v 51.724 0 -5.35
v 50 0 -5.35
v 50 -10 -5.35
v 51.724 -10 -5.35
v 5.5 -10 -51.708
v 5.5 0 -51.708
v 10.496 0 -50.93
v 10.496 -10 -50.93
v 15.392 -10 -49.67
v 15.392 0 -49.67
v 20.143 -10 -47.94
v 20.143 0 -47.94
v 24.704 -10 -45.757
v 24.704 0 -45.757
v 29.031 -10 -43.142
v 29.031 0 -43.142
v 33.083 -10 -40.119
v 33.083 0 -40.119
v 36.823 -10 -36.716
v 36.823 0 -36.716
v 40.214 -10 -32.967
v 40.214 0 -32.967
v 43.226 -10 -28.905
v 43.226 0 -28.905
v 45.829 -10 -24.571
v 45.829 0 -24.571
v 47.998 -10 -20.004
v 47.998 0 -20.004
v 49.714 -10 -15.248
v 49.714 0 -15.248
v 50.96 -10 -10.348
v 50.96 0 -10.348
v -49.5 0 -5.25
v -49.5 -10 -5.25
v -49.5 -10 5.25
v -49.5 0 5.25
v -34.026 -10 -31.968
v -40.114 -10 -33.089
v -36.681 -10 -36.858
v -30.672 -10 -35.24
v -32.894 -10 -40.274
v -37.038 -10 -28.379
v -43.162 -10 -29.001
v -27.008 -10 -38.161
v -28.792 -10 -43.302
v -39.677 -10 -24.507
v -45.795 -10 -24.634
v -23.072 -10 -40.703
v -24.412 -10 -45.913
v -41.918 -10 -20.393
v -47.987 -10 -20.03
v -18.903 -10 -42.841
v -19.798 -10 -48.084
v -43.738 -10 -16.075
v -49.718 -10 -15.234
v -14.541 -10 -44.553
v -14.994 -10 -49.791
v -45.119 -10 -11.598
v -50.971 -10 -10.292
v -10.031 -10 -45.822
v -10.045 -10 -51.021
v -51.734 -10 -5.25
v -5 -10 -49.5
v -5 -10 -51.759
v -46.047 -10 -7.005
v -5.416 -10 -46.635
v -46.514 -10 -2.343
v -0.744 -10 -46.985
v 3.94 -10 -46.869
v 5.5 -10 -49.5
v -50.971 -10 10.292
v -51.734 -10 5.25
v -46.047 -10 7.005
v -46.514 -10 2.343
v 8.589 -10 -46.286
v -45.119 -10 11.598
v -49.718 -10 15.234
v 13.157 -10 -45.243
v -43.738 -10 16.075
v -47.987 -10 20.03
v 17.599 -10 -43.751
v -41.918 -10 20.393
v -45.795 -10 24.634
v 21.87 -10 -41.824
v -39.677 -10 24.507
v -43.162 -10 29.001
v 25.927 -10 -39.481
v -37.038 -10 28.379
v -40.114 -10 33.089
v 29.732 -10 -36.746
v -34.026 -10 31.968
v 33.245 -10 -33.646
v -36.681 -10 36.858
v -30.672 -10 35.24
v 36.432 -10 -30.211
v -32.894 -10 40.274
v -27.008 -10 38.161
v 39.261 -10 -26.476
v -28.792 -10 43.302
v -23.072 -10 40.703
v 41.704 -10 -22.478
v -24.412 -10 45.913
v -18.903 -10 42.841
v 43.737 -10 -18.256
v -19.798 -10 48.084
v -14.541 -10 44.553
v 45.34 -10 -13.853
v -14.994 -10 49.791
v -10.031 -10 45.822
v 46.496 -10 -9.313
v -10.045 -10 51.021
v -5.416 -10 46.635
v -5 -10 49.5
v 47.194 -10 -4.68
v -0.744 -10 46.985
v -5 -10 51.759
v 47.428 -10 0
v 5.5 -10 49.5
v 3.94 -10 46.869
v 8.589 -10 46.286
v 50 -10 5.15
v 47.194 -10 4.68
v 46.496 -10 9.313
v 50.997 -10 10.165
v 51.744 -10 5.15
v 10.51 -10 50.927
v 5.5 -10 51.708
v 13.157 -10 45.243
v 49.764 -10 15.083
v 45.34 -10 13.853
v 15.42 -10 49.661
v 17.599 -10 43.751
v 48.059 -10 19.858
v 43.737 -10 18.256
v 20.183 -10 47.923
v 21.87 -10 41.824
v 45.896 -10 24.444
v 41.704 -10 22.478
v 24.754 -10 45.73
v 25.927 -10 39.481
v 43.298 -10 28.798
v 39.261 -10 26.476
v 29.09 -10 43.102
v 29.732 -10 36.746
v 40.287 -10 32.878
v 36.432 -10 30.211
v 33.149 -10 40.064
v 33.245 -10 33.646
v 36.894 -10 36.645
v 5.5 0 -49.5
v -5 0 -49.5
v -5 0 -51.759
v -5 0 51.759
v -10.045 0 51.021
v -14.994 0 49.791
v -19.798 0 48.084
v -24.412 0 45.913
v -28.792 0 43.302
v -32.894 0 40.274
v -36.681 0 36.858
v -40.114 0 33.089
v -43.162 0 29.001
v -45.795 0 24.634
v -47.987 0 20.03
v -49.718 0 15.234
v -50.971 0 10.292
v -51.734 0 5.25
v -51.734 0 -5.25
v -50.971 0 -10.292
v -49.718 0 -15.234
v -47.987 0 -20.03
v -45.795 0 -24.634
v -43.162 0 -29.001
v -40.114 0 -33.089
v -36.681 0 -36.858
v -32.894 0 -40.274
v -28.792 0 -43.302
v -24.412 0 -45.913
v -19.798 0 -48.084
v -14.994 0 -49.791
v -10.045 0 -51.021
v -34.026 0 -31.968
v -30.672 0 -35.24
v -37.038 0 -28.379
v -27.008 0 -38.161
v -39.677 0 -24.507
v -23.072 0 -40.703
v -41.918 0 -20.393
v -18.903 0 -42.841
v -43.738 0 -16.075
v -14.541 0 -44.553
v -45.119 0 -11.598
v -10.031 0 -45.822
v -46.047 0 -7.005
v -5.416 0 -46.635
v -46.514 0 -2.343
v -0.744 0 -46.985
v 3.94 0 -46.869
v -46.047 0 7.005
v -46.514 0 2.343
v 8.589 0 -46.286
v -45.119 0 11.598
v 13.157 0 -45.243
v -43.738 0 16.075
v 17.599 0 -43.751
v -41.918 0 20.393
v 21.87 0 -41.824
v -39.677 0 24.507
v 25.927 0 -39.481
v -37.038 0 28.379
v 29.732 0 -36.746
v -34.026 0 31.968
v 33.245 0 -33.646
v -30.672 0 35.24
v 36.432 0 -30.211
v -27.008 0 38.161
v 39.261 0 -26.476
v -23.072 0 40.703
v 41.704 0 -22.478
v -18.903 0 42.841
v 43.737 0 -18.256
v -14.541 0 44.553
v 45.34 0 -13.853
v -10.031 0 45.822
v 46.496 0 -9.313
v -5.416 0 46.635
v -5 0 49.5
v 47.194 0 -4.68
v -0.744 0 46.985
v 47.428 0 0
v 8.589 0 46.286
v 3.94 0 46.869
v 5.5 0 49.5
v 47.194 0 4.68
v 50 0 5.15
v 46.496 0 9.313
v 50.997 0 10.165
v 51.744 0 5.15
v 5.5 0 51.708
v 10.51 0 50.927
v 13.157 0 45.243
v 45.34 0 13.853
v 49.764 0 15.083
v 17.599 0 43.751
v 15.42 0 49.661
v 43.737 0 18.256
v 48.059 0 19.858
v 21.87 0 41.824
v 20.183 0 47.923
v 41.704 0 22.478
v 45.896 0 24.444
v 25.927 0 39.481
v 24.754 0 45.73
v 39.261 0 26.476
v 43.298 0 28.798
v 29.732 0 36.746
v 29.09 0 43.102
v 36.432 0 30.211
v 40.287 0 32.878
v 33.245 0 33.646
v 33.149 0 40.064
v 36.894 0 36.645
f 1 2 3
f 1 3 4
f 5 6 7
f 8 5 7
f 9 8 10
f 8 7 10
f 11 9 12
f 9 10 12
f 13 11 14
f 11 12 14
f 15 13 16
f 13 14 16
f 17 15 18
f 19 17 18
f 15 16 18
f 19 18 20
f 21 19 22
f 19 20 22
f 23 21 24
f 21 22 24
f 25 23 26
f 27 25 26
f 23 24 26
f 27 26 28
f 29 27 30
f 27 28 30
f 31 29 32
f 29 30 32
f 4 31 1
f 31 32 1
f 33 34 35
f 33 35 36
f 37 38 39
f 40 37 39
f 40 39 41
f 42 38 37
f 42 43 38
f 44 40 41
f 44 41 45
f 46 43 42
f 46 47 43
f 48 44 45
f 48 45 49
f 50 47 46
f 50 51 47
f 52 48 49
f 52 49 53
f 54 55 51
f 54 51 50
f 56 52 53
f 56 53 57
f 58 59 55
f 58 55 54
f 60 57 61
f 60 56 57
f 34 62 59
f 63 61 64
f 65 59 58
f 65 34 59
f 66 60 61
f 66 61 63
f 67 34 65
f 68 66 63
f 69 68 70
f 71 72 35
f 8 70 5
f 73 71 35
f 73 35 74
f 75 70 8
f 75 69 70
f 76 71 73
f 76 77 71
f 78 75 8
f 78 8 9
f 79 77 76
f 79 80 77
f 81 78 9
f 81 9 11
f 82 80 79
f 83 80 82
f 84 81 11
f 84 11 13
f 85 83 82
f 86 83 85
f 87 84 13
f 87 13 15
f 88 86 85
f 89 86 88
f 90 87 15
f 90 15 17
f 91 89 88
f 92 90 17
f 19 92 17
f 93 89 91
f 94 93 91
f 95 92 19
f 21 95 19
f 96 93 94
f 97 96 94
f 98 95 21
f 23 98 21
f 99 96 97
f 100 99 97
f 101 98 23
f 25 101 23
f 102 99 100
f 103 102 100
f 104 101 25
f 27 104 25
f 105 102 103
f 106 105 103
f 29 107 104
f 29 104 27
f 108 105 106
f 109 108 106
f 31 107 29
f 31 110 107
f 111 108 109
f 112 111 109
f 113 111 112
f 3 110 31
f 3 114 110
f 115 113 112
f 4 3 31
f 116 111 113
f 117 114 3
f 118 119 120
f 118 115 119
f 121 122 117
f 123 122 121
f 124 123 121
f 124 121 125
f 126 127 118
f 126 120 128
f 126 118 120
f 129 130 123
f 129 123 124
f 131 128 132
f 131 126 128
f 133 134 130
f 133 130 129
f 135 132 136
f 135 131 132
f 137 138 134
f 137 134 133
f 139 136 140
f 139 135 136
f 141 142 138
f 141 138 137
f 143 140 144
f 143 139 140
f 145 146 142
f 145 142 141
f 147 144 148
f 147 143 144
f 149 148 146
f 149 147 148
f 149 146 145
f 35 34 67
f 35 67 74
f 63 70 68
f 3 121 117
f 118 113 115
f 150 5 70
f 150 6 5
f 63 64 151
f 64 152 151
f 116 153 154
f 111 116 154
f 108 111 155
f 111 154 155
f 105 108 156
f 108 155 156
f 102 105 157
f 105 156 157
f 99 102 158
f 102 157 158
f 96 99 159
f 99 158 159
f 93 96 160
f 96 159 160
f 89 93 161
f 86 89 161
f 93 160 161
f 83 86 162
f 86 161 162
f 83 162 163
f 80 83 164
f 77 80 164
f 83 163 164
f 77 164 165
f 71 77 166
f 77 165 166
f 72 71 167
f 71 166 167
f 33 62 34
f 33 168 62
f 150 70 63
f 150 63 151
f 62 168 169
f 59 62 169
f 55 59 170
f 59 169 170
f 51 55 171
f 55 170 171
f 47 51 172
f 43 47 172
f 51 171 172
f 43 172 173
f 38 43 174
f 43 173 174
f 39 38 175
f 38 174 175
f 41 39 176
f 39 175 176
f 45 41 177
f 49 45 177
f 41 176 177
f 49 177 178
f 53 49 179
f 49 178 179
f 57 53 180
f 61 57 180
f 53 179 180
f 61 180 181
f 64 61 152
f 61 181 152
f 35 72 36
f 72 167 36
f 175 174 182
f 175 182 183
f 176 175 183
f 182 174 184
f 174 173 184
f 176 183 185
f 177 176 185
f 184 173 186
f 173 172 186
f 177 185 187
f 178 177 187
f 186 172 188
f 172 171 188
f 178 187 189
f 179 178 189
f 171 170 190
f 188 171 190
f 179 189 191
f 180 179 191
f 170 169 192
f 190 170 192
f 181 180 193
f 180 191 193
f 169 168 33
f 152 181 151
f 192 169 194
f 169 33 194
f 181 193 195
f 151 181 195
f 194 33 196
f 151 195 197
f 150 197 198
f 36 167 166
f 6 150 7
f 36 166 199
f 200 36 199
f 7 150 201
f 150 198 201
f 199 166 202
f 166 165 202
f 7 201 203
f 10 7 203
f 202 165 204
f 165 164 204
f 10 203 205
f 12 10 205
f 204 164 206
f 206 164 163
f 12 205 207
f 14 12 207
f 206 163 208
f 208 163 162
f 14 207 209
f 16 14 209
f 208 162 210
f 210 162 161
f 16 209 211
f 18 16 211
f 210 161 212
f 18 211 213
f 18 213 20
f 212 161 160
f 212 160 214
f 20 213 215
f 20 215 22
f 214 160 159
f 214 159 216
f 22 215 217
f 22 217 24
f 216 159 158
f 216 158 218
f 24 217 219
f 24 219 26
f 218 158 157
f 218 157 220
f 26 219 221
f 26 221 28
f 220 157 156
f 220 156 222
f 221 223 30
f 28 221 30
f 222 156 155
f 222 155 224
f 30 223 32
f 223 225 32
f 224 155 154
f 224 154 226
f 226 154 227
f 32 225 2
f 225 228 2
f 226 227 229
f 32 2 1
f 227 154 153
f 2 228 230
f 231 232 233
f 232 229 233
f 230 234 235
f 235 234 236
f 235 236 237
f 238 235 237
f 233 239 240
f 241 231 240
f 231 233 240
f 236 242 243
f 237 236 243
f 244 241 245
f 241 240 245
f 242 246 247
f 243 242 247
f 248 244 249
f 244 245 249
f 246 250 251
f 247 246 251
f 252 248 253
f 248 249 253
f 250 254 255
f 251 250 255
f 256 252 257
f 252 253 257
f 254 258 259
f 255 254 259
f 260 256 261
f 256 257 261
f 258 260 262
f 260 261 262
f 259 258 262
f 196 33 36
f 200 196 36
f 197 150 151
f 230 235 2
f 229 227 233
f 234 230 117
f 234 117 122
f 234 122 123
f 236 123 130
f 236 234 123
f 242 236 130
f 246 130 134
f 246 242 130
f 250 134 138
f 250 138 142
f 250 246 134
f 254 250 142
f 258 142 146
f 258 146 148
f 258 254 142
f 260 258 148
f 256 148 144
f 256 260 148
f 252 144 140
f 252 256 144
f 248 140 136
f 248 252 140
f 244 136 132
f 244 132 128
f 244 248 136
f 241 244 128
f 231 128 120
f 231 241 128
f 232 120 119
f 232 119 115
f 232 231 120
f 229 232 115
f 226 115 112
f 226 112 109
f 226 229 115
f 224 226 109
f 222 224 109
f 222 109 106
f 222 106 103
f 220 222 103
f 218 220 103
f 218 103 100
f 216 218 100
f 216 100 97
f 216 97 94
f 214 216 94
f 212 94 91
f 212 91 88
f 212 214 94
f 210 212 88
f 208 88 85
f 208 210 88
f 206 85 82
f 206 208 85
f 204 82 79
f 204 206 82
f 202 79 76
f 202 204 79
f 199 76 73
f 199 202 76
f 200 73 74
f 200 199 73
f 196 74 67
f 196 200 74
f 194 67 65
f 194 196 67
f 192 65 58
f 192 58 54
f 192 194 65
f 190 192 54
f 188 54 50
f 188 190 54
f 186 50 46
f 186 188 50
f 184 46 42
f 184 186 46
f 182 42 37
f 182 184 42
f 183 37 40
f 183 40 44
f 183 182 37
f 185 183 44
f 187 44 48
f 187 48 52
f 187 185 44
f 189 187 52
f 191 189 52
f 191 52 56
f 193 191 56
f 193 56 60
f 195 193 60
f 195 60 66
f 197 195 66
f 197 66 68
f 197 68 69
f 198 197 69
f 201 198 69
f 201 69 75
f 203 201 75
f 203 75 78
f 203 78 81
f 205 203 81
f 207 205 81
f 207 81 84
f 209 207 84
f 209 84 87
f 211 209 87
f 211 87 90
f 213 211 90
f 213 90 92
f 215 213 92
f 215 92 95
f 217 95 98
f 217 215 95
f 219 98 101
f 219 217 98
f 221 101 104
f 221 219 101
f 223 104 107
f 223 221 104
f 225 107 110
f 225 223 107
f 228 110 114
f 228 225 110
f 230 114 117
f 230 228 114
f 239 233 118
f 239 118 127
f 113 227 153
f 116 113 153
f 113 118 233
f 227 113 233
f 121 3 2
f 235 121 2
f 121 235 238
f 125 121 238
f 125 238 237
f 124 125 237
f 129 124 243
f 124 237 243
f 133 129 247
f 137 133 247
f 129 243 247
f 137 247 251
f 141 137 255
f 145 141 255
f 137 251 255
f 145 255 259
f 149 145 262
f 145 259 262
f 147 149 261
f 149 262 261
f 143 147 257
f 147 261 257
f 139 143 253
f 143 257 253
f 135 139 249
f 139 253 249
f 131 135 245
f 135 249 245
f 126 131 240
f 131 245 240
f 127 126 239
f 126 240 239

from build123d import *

# Parameters (mm, degrees)
BOX004_W         = 10
BOX004_H         = 15
BOX004_DEPTH     = 10.5
BOX003_W         = 10
BOX003_H         = 15
BOX003_DEPTH     = 10.5
BOX002_W         = 10
BOX002_H         = 15
BOX002_DEPTH     = 10.5
BOX001_W         = 10
BOX001_H         = 15
BOX001_DEPTH     = 10.5
SKETCH017_R      = 52
SKETCH017_R_2    = 47
EXTRUDE004_DEPTH = 10


with BuildPart() as cube004:
    # Box004 → Box004 (new body)
    with BuildSketch(Plane(origin=(5.5, -12, 49.5), x_dir=(0, 0, 1), z_dir=(-1, 0, 0))):
        with Locations((5, 7.5)):
            Rectangle(BOX004_W, BOX004_H)
    extrude(amount=BOX004_DEPTH)


with BuildPart() as cube003:
    # Box003 → Box003 (new body)
    with BuildSketch(Plane(origin=(5.5, -12, -59.5), x_dir=(0, 0, 1), z_dir=(-1, 0, 0))):
        with Locations((5, 7.5)):
            Rectangle(BOX003_W, BOX003_H)
    extrude(amount=BOX003_DEPTH)


with BuildPart() as cube002:
    # Box002 → Box002 (new body)
    with BuildSketch(Plane(origin=(50, -12, -5.35), x_dir=(1, 0, 0), z_dir=(0, 0, 1))):
        with Locations((5, 7.5)):
            Rectangle(BOX002_W, BOX002_H)
    extrude(amount=BOX002_DEPTH)


with BuildPart() as cube001:
    # Box001 → Box001 (new body)
    with BuildSketch(Plane(origin=(-59.5, -12, -5.25), x_dir=(1, 0, 0), z_dir=(0, 0, 1))):
        with Locations((5, 7.5)):
            Rectangle(BOX001_W, BOX001_H)
    extrude(amount=BOX001_DEPTH)


with BuildPart() as brace_jig:
    # Sketch017 → Extrude004 (new body)
    with BuildSketch(Plane.XZ):
        Circle(SKETCH017_R)
        with Locations((0.427685, 0)):
            Circle(SKETCH017_R_2, mode=Mode.SUBTRACT)
    extrude(amount=EXTRUDE004_DEPTH)

    # Cut004: cut Cube001
    add(cube001.part, mode=Mode.SUBTRACT)

    # Cut005: cut Cube002
    add(cube002.part, mode=Mode.SUBTRACT)

    # Cut006: cut Cube003
    add(cube003.part, mode=Mode.SUBTRACT)

    # Cut007: cut Cube004
    add(cube004.part, mode=Mode.SUBTRACT)


solid = brace_jig.part
